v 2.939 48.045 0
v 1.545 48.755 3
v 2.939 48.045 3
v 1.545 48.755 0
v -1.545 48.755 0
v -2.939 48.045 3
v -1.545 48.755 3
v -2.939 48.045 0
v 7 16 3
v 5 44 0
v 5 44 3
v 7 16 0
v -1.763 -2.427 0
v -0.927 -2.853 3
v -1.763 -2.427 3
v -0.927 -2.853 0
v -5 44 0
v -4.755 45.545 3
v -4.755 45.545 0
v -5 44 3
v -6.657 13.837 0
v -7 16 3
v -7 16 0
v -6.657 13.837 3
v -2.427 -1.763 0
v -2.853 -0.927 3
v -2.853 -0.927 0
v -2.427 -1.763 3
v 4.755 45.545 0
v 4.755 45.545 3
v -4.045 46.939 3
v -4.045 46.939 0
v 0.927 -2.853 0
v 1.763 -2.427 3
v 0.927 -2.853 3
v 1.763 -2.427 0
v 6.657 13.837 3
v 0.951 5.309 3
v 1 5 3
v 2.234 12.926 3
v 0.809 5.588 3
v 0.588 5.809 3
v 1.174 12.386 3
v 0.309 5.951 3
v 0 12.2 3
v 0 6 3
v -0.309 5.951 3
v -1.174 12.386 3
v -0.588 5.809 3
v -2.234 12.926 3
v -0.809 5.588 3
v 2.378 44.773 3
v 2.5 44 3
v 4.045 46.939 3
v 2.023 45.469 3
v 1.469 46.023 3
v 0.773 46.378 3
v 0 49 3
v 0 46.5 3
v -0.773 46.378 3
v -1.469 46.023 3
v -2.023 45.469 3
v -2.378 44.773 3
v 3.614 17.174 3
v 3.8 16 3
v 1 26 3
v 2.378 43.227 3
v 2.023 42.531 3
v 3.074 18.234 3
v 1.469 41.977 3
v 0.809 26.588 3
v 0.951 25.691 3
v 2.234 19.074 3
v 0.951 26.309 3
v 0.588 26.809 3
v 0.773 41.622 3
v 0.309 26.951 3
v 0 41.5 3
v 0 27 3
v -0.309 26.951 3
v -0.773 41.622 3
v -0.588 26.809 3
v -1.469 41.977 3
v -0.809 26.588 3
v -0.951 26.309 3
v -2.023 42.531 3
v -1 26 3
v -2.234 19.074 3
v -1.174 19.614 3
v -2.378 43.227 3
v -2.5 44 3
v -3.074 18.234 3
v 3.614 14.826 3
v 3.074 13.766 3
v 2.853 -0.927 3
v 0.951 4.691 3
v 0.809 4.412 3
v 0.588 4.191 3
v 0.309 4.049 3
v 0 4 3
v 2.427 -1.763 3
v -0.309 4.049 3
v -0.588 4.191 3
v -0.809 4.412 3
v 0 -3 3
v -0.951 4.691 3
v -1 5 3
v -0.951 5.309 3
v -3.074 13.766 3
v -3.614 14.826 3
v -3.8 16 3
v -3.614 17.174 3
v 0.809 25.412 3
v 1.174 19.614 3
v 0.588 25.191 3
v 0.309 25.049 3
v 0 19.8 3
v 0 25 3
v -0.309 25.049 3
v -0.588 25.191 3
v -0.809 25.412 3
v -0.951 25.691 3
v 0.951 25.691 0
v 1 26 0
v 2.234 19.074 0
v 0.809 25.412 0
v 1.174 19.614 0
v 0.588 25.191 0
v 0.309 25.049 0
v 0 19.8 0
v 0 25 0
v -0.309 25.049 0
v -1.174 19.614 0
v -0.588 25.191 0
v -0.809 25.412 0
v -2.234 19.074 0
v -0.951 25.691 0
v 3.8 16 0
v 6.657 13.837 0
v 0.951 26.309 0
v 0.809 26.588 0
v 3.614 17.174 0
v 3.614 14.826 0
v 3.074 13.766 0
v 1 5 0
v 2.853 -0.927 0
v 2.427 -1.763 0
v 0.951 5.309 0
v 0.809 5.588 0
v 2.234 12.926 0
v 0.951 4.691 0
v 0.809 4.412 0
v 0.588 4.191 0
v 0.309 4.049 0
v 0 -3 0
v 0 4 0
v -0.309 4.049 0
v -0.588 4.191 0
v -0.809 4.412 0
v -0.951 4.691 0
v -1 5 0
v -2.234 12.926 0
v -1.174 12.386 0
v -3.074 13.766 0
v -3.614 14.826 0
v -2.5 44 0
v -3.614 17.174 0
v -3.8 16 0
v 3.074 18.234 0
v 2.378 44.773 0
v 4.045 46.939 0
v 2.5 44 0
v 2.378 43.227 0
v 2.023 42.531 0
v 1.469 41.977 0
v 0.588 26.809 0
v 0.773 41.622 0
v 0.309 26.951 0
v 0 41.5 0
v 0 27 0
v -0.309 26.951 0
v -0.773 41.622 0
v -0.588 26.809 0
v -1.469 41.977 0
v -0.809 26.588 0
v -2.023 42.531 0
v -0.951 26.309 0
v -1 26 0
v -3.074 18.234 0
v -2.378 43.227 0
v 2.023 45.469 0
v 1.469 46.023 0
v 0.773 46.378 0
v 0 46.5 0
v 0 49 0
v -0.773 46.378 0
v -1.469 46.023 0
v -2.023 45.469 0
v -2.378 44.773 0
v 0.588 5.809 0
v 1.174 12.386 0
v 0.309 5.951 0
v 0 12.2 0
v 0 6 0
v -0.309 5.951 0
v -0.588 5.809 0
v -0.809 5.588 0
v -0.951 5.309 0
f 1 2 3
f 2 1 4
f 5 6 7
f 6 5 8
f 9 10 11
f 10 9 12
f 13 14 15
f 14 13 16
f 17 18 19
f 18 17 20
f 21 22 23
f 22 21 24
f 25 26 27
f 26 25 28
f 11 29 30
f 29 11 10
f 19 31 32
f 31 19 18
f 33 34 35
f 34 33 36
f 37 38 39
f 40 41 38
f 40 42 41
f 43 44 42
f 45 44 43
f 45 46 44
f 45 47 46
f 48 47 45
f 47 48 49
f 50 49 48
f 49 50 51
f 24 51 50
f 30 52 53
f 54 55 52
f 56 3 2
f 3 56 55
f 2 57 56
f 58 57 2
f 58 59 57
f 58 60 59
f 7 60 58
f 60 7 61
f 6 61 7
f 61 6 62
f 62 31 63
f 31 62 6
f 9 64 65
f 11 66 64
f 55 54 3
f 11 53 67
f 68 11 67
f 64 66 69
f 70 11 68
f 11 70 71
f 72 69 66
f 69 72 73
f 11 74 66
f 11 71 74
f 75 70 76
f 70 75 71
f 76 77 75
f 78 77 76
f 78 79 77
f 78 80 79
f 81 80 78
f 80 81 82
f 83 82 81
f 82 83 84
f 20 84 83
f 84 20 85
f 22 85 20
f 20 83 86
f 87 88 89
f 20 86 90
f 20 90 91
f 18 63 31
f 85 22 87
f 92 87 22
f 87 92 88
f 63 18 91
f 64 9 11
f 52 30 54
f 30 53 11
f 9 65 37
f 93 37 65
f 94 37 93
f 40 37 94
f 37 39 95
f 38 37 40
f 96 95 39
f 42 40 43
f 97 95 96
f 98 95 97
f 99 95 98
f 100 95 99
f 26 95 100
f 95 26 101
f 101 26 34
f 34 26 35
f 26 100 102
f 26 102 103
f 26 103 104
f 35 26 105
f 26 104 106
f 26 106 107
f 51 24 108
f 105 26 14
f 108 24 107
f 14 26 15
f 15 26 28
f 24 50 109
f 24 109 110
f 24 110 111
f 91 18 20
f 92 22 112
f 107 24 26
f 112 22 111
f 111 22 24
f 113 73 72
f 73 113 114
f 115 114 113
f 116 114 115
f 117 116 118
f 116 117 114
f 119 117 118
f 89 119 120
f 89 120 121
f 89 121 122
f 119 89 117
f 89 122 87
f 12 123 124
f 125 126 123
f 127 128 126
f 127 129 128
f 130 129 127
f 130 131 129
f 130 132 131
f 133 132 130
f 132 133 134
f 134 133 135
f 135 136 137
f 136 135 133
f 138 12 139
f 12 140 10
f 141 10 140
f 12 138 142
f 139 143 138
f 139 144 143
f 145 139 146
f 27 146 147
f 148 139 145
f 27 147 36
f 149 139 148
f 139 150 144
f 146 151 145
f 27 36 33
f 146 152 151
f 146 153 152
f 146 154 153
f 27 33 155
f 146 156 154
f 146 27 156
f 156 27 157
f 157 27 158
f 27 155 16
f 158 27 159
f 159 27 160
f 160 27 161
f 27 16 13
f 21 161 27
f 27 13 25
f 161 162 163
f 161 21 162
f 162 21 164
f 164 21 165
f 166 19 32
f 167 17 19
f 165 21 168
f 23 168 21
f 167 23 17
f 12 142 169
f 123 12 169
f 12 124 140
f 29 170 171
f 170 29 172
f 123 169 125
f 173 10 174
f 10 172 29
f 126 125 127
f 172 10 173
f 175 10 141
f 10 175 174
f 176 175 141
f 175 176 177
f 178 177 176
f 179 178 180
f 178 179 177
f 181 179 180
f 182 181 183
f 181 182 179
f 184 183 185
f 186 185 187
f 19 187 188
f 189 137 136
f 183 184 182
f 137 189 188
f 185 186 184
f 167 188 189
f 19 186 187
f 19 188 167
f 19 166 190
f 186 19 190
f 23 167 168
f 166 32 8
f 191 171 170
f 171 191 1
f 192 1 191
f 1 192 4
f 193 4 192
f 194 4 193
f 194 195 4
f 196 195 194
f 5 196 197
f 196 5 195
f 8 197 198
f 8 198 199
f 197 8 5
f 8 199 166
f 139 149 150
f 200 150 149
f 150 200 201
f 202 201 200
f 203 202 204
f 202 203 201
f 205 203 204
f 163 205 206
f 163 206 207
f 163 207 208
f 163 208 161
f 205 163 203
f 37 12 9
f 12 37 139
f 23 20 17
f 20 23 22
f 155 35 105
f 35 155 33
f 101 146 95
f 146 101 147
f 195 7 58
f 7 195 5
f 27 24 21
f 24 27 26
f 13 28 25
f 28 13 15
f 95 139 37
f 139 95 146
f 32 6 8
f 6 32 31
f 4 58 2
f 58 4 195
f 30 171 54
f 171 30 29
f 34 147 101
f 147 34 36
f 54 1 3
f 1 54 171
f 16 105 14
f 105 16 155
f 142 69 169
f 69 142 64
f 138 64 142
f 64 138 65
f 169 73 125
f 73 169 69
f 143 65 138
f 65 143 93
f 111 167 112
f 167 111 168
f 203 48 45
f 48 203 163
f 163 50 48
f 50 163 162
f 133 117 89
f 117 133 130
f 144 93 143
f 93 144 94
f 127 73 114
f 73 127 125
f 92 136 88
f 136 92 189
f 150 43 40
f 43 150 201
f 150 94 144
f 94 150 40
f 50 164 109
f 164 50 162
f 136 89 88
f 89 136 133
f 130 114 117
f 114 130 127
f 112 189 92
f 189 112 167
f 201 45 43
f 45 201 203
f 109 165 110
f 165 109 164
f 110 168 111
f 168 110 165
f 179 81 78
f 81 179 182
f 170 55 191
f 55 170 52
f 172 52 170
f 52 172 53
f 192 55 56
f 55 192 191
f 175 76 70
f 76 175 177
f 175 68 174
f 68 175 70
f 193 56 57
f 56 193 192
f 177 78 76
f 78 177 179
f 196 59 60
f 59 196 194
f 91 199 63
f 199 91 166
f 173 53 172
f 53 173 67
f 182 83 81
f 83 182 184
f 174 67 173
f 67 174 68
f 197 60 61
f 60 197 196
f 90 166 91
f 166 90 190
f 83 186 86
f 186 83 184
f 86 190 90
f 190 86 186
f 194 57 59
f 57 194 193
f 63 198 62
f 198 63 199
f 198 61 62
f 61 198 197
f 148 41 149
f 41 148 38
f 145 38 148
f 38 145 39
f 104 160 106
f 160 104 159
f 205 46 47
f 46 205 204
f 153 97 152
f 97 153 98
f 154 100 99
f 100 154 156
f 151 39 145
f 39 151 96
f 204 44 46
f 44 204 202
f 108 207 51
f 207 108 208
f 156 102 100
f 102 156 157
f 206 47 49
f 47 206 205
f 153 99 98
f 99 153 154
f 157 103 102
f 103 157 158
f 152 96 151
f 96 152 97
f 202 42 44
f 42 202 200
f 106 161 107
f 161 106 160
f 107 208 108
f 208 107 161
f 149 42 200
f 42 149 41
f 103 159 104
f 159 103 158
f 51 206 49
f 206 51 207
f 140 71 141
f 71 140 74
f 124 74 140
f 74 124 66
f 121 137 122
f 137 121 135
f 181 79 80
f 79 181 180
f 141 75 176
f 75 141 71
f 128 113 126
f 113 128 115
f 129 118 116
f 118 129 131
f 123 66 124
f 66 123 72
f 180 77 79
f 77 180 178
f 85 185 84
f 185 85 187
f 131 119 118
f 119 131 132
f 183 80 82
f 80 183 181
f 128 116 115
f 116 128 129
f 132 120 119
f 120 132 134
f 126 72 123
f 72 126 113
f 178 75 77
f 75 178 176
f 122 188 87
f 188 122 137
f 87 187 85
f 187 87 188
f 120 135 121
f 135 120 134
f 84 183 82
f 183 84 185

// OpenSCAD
$fn=20;

//cube([13,55,4]);

difference()
{
hull()
	{
	cylinder(d=6,h=3);
	translate ([0,16,0]) cylinder(d=14,h=3);
	translate ([0,44,0]) cylinder(d=10,h=3);
	}

translate ([0,16,-1]) cylinder(d=7.6,h=6);
translate ([0,44,-1]) cylinder(d=5,h=6);
translate ([0,5,-1]) cylinder(d=2,h=6);
translate ([0,26,-1]) cylinder(d=2,h=6);
}
//translate ([]) cylinder(d=7,h=6);
